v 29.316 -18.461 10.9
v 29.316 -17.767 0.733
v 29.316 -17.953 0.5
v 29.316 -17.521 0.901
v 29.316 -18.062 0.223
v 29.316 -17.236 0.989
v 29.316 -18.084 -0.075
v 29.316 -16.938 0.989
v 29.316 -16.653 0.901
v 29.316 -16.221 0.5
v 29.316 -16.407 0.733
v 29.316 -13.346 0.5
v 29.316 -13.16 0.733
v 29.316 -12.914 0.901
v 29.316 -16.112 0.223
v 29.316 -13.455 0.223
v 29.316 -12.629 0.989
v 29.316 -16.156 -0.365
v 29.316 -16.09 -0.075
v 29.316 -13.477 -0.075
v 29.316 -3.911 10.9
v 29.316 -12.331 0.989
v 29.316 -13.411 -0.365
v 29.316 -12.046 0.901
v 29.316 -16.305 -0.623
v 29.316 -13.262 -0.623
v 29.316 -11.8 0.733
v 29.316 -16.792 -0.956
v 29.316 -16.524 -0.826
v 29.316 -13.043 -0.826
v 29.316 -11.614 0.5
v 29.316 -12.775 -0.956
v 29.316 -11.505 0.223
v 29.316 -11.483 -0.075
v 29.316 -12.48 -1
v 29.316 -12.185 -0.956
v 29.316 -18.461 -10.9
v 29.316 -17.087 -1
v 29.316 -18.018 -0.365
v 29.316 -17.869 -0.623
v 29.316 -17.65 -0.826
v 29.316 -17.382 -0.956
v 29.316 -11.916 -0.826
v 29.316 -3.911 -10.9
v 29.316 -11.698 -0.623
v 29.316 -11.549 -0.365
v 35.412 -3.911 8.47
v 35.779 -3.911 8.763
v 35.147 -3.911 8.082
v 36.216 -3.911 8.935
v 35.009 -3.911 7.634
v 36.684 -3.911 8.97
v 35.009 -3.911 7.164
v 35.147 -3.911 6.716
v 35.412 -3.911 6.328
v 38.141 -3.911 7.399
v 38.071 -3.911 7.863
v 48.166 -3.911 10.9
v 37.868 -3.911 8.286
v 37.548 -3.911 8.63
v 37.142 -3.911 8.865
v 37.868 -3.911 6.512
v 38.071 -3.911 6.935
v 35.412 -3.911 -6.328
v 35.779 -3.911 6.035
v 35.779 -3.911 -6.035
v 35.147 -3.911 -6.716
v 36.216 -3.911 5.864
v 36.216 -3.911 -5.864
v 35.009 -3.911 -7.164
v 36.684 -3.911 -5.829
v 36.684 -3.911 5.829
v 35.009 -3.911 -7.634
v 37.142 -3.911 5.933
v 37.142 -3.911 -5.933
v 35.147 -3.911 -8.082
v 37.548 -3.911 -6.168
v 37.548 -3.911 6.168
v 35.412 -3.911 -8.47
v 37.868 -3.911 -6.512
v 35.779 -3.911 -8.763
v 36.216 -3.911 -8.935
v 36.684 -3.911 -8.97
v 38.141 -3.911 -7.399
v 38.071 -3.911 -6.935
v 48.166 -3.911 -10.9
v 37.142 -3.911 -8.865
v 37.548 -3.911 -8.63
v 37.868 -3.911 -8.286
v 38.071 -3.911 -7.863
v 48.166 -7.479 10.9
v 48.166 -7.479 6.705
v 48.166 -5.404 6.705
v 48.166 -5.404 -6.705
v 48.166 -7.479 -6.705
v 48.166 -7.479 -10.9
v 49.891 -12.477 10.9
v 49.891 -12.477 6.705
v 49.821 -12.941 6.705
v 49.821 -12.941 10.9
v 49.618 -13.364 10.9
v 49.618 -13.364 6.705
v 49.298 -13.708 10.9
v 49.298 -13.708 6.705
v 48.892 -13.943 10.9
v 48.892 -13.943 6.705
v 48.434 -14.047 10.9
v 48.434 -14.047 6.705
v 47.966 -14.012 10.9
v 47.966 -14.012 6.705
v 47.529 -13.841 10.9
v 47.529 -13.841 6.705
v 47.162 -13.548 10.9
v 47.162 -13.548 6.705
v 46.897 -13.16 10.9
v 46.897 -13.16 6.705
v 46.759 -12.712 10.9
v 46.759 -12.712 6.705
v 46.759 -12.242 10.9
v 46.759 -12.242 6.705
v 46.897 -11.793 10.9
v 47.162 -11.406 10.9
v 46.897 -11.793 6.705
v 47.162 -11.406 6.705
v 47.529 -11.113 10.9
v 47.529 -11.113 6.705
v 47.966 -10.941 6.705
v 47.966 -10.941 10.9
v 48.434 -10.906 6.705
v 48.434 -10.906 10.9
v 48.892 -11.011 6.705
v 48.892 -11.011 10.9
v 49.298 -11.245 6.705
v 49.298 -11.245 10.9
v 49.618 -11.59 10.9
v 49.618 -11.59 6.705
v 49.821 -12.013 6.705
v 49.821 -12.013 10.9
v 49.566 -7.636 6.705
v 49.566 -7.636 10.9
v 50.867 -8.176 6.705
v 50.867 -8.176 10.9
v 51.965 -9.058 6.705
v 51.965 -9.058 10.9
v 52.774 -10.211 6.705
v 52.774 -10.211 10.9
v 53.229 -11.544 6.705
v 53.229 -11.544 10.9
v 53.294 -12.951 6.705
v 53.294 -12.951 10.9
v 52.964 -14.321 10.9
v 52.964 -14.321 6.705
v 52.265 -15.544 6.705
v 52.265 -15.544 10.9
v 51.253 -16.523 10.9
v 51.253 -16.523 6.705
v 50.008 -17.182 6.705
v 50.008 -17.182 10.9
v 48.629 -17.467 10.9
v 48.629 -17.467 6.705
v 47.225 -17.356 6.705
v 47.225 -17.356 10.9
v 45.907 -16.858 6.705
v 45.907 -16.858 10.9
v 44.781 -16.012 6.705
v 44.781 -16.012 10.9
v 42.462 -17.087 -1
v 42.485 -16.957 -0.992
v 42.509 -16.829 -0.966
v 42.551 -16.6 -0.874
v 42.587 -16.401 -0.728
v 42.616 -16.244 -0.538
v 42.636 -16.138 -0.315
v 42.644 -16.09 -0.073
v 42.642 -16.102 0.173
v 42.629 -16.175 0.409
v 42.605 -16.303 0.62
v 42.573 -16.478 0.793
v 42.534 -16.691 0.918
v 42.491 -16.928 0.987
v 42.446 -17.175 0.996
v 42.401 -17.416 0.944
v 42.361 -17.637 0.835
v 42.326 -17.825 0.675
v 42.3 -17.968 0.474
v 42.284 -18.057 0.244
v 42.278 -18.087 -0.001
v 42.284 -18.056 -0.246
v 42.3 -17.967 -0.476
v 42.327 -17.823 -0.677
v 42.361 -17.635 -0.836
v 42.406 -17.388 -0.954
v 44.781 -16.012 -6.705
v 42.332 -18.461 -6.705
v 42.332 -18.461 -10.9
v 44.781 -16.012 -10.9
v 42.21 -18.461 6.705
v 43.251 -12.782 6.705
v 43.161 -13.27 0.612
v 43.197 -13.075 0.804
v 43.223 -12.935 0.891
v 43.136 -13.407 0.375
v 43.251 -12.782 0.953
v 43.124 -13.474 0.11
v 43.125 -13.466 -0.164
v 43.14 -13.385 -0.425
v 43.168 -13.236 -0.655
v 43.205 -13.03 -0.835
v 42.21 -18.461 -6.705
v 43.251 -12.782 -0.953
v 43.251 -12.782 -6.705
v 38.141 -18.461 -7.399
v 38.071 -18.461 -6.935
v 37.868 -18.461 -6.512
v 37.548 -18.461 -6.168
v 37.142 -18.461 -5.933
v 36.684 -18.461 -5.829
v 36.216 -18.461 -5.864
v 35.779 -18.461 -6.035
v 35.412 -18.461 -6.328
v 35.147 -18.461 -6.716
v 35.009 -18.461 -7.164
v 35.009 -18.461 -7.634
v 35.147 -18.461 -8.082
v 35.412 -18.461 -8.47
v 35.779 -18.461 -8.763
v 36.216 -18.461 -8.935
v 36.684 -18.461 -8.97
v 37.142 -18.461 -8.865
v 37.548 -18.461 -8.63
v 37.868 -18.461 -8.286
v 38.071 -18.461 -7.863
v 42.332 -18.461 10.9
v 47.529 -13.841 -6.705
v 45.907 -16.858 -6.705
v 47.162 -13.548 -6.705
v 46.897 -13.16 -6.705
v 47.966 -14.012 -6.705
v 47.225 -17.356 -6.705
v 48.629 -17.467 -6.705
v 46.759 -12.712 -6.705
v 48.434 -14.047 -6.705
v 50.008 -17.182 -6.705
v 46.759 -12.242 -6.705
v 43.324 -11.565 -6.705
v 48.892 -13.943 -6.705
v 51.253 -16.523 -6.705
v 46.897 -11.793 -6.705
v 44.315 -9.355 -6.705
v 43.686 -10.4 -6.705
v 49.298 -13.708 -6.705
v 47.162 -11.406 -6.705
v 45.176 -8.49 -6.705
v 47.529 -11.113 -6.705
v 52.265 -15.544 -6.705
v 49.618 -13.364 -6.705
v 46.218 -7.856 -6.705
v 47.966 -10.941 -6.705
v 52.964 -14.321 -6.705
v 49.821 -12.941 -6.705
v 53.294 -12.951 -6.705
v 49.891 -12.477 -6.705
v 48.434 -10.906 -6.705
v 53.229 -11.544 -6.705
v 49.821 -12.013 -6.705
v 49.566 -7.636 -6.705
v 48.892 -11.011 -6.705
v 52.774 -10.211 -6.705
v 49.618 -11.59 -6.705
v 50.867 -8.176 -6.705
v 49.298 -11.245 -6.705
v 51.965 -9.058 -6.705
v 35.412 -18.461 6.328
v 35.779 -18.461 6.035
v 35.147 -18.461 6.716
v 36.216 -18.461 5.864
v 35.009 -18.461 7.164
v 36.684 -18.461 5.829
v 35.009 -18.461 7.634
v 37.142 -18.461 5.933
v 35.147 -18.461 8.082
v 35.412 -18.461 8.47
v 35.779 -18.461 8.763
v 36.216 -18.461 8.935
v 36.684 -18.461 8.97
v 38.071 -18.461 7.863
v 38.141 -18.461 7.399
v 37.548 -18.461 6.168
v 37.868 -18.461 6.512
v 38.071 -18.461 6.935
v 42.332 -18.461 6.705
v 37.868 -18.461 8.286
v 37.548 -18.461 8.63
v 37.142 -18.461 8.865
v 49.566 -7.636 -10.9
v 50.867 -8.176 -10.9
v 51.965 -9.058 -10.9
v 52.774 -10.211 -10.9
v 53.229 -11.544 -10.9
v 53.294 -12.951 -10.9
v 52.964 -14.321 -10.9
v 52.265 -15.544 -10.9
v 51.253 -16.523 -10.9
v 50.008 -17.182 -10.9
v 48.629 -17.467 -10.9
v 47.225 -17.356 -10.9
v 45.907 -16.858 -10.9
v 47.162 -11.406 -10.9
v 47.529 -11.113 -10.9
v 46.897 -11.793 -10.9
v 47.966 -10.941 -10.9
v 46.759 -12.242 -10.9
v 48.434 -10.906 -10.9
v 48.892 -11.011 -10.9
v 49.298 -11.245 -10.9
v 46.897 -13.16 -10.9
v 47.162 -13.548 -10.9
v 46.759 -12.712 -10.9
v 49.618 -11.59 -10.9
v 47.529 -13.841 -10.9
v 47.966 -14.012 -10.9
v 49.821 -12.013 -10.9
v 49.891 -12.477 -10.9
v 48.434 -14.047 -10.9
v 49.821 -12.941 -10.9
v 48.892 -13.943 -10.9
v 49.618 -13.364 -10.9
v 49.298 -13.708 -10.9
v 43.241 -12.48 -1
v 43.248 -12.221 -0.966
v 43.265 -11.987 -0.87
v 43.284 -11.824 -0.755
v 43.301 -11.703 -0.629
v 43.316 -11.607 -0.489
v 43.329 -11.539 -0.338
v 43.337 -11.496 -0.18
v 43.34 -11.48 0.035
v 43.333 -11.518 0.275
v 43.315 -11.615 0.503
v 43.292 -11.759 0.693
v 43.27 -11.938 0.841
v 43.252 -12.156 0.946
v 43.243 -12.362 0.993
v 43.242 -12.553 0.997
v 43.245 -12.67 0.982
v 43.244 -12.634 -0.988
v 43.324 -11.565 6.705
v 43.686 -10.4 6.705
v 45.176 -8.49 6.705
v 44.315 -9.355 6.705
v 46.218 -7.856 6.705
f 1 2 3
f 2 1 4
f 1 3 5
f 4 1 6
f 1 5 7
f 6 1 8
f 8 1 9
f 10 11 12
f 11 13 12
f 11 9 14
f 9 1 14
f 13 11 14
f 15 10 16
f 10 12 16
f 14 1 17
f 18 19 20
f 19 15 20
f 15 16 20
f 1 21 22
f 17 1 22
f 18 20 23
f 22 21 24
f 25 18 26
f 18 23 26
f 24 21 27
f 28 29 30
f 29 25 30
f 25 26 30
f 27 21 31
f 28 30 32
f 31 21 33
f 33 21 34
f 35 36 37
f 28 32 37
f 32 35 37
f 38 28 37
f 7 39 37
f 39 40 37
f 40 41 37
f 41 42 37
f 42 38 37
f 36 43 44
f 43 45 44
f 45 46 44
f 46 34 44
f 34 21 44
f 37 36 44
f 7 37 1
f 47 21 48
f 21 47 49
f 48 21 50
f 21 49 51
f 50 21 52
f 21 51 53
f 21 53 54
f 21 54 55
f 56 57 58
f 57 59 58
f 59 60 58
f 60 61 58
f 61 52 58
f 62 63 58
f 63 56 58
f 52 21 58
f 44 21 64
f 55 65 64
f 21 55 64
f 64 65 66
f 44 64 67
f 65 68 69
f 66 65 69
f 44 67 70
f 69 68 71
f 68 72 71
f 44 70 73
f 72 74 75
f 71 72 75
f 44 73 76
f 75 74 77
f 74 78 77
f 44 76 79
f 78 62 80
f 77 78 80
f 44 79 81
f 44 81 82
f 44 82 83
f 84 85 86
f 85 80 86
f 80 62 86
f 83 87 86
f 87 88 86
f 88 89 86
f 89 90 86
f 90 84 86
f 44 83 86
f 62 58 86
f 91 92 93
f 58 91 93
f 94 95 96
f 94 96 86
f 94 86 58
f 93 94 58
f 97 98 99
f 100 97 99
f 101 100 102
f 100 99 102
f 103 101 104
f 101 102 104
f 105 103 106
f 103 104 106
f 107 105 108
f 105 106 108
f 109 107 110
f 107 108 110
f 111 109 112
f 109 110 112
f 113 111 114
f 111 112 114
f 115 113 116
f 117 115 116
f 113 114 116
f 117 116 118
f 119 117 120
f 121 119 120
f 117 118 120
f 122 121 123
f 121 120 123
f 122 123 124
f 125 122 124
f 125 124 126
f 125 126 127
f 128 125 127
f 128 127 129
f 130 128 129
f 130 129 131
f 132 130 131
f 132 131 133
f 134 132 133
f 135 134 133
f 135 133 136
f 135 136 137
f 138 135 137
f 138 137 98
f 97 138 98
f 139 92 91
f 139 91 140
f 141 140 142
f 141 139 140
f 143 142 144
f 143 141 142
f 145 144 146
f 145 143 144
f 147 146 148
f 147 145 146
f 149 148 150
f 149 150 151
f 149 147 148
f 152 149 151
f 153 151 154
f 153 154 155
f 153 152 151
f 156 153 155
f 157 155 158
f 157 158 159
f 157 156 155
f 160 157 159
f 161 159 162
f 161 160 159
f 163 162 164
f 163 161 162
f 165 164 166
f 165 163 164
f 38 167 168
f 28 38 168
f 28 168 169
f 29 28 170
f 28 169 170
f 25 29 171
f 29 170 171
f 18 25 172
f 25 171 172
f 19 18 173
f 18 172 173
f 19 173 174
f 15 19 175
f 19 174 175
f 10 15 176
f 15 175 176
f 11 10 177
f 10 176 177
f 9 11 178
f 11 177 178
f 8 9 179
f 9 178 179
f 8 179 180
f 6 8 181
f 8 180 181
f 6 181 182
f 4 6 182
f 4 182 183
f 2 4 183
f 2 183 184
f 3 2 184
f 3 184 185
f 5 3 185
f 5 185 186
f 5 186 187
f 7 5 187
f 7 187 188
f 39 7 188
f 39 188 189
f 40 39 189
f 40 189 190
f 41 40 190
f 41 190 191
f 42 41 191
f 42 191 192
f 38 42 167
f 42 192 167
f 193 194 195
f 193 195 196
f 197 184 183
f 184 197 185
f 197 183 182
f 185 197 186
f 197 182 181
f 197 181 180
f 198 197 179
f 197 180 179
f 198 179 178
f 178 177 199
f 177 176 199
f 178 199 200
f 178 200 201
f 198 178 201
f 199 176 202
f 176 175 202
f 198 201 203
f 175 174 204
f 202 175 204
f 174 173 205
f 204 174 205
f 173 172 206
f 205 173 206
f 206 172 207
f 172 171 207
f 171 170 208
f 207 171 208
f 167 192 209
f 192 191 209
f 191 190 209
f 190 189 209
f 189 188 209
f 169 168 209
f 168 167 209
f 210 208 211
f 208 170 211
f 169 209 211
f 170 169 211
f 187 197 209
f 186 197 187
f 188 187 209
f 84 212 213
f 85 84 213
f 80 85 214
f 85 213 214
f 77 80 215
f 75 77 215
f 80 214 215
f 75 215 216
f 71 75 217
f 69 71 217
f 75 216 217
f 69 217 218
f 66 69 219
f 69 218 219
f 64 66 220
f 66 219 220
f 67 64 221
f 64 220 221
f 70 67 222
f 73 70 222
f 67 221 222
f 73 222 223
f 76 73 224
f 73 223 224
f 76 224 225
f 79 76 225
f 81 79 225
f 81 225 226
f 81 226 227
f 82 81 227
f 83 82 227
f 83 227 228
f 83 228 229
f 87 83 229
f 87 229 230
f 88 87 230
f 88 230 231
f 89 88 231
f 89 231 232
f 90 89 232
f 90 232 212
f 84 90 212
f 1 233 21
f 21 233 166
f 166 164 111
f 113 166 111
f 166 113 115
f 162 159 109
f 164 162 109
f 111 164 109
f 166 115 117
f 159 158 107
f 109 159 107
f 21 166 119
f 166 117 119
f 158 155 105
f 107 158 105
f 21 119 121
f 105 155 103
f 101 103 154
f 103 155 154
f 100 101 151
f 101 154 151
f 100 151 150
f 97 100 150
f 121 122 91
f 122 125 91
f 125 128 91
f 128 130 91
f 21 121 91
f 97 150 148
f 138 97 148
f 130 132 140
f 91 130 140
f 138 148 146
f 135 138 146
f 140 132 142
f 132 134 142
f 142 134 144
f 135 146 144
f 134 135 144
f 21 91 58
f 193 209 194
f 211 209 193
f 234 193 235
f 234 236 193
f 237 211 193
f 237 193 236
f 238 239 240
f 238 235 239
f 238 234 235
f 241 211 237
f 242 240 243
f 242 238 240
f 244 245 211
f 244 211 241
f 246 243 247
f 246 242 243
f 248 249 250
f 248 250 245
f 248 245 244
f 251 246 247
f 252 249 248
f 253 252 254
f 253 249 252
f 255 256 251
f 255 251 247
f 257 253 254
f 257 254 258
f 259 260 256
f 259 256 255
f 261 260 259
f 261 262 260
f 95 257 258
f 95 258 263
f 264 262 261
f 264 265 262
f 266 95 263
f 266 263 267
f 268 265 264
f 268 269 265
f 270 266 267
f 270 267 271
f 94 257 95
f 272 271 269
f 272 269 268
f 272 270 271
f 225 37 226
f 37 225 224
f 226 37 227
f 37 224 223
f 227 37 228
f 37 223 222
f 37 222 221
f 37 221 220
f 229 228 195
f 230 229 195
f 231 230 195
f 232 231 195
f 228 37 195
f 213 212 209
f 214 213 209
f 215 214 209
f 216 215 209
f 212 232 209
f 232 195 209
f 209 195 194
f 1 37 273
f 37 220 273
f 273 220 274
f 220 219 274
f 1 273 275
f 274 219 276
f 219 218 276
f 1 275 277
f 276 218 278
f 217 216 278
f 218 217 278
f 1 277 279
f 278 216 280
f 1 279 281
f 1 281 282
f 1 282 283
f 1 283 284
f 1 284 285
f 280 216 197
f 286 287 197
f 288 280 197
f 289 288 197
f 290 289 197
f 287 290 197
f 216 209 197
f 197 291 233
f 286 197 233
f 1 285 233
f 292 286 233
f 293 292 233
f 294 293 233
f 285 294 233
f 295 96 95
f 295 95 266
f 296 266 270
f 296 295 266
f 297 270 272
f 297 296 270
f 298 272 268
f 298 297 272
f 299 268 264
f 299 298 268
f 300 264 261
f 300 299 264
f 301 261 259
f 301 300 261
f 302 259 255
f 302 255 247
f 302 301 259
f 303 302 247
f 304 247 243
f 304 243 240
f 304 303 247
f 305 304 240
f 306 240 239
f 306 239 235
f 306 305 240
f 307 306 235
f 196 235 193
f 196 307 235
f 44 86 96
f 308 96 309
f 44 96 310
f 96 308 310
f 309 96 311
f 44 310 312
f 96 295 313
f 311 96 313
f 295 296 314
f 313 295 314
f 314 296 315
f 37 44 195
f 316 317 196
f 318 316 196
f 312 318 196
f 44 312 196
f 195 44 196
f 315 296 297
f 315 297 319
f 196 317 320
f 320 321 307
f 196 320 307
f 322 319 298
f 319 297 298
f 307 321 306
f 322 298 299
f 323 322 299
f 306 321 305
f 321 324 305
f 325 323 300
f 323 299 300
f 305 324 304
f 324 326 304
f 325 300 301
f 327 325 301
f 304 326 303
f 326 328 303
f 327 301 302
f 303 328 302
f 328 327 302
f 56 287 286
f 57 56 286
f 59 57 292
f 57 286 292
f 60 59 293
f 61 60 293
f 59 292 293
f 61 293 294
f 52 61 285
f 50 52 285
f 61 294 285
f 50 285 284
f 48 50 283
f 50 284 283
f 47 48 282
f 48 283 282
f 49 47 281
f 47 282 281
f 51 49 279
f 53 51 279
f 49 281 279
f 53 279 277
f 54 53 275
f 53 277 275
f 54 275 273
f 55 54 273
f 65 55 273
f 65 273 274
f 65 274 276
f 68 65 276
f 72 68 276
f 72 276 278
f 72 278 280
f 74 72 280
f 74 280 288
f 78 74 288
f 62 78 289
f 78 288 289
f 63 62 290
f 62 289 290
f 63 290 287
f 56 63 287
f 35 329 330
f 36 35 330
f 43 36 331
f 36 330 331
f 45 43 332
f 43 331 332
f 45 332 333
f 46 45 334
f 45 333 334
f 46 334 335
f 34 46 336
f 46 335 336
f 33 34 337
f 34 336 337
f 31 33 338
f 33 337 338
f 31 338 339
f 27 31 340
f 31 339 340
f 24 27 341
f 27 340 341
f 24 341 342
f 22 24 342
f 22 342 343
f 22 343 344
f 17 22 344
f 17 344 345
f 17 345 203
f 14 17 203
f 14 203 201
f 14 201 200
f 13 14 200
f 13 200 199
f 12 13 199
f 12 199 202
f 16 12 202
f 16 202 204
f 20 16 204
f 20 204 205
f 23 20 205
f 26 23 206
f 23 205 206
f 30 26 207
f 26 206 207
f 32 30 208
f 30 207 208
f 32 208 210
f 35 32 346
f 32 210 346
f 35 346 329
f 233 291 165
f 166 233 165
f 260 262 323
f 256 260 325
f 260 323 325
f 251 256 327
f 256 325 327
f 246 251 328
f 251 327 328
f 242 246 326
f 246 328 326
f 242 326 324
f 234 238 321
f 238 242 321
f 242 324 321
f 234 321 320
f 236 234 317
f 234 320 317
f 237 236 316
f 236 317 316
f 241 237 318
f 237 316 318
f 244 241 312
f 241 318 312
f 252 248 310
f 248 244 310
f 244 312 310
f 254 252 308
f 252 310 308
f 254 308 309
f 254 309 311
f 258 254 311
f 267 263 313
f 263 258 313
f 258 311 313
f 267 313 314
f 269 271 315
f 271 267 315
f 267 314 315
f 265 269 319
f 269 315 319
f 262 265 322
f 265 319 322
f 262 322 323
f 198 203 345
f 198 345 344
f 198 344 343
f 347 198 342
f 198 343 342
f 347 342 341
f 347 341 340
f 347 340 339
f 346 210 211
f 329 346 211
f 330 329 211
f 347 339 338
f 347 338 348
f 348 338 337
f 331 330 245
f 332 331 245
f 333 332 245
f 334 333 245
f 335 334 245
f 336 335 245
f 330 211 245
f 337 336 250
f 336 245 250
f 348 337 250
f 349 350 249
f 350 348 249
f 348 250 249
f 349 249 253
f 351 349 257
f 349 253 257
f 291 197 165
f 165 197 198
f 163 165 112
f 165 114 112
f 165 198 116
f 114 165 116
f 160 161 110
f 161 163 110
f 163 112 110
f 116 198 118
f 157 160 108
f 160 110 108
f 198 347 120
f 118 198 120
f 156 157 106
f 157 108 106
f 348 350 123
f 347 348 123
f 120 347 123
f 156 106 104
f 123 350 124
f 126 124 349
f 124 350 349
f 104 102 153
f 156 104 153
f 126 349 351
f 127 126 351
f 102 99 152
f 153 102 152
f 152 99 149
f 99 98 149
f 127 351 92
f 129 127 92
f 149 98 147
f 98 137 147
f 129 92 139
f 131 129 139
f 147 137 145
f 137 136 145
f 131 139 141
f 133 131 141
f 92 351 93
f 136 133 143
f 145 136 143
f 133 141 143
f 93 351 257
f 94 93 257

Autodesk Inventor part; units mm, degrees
sketch "Sketch2" plane through (0, 0, 0) normal (0, 0, 1) x (1, 0, 0)
  line L0 (40.7935, -19.9997) -> (-67.2065, -19.9997)
  line L1 (-67.2065, -19.9997) -> (-67.2065, 11.0003)
  circle A0 centre (48.3164, -12.4768) radius 1.575
  arc A1 (44.7809, -16.0123) -> (48.1664, -7.4791) centre (48.3164, -12.4768) ccw
  line L2 (48.1664, 0.0003) -> (48.1664, -7.4791)
  line L3 (48.3164, -12.4768) -> (48.1664, -12.6268)
  line L4 (44.7809, -16.0123) -> (40.7935, -19.9997)
  line L5 (-67.2065, 11.0003) -> (28.1664, 11.0003)
  line L6 (28.1664, 11.0003) -> (48.1664, 0.0003)
  dimension "d19" = 3.15
  dimension "d88" = 10
  dimension "d90" = 0.15
  dimension "d91" = 10.639
  dimension "d111" = 31
  dimension "d135" = 12.4771
  dimension "d176" = 135
  dimension "d177" = 108
extrude "Extrusion1" add sketch "Sketch2" along normal mid plane 23
sketch "Sketch5" plane through (0, 0, 0) normal (0, 0, 1) x (1, 0, 0)
  circle A0 centre (48.3164, -12.4768) radius 1.575 projected
  circle A1 centre (48.3164, -12.4768) radius 5.075
  circle A2 centre (48.3164, -12.4768) radius 1.5
  point P0 (0, 0)
  dimension "d28" = 3
  dimension "d29" = 10.15
extrude "Extrusion3" cut sketch "Sketch5" along normal mid plane 13.41 contours A1
chamfer "Chamfer2" distance 2 angle 45 1 edges at (48.1664, -7.404, 0)
sketch "Sketch15" plane through (48.1664, -7.4791, -11.5) normal (1, 0, 0) x (0, 0, -1)
  arc A0 (-14.3604, 7.4791) -> (-8.6396, 7.4791) centre (-11.5, 7.4791) ccw
  line L0 (-14.3604, 7.4791) -> (-14.3604, 27.4791)
  line L1 (-14.3604, 27.4791) -> (-8.6396, 27.4791)
  line L2 (-8.6396, 27.4791) -> (-8.6396, 7.4791)
  point P0 (-14.3604, 7.4793)
  point P1 (-11.5, 27.4791)
  dimension "d95" = 5.7208
  dimension "d113" = 20
sketch "Sketch19" plane through (-67.2065, -19.9997, 11.5) normal (0, -1, 0) x (1, 0, 0)
  line L0 (63.0729, -6) -> (91.3729, -6)
  line L1 (91.3729, -6) -> (91.3729, -19.5)
  line L2 (91.3729, -19.5) -> (63.0729, -19.5)
  line L3 (63.0729, -19.5) -> (63.0729, -6)
  line L4 (63.0729, -6) -> (91.3729, -19.5) construction
  line L5 (91.3729, -6) -> (63.0729, -19.5) construction
  line L6 (115.3729, -18.205) -> (115.3729, -4.795) projected
  line L7 (95.3729, 0) -> (0, 0) projected
  line L8 (108, -23) -> (0, -23) projected
  circle A0 centre (77.2229, -12.75) radius 8.1325
  point P0 (67.2065, -11.5)
  dimension "d104" = 13.5
  dimension "d114" = 24
  dimension "d195" = 28.3
  dimension "d205" = 6
  dimension "d224" = 16.265
extrude "Extrusion13" cut sketch "Sketch19" against normal blind 30 contours L0 A0 L2 L3 | L0 A0 L2 | L0 L1 L2 A0
sketch "Sketch21" plane through (-67.2065, -19.9997, 11.5) normal (0, -1, 0) x (1, 0, 0)
  line L0 (63.0729, -6) -> (91.3729, -6) projected
  line L1 (63.0729, -19.5) -> (63.0729, -6) construction
  line L2 (91.3729, -19.5) -> (63.0729, -19.5) construction
  line L3 (63.0729, -6) -> (91.3729, -19.5)
  line L4 (91.3729, -6) -> (63.0729, -19.5)
  line L5 (95.0229, -19.5) -> (59.4229, -19.5)
  line L6 (59.4229, -19.5) -> (59.4229, -6)
  line L7 (59.4229, -6) -> (95.0229, -6)
  line L8 (95.0229, -6) -> (95.0229, -19.5)
  line L9 (95.0229, -19.5) -> (59.4229, -6) construction
  line L10 (59.4229, -19.5) -> (95.0229, -6) construction
  line L11 (108, -23) -> (108, 0) projected
  point P0 (77.2229, -12.75)
  point P1 (26.7729, -20.5)
  point P2 (26.7729, -7)
  dimension "d164" = 35.6
  dimension "d165" = 13.5
extrude "Extrusion14" cut sketch "Sketch21" against normal blind 10.1
sketch "Sketch20" plane through (-67.2065, 11.0003, 11.5) normal (0, 1, 0) x (1, 0, 0)
  line L0 (115.3729, 23) -> (115.3729, 0) projected
  line L1 (115.3729, 11.5) -> (95.3729, 11.5)
  point P0 (67.2065, 11.5)
  dimension "d107" = 20
sweep "Sweep3" cut profiles "Sketch15" path "Sketch20" path curves L1
sketch "Sketch22" plane through (48.1664, -7.4791, 11.5) normal (1, 0, 0) x (0, 0, -1)
  circle A0 centre (11.5, -5.0007) radius 1
  line L0 (23, -12.5207) -> (0, -12.5207) projected
  circle A1 centre (11.5, -9.6079) radius 1
  point P0 (11.5, 7.4791)
  dimension "d126" = 7.52
  dimension "d127" = 2.9128
  dimension "d128" = 2
  dimension "d129" = 2
extrude "Extrusion15" cut sketch "Sketch22" against normal through all
ref_plane "Work Plane4" through (48.1664, -2.8604, 0) normal (0, 1, 0) x (-1, 0, 0)
sketch "Sketch26" plane through (48.1664, -2.8604, 0) normal (0, 1, 0) x (-1, 0, 0)
  line L0 (0, -6.705) -> (0, 6.705) projected
  arc A0 (16.24, -0.7321) -> (16.24, 0.7321) centre (16.24, 0) ccw
  line L1 (16.24, -0.7321) -> (0, -0.7321)
  line L2 (16.24, 0.7321) -> (0, 0.7321)
  line L3 (0, 0.7321) -> (0, -0.7321)
  point P0 (48.1664, 0)
  dimension "d147" = 1.4642
chamfer "Chamfer3" distance 3.6 angle 45 1 edges at (44.7278, -16.0654, 0)
extrude "Extrusion22" add sketch "Sketch26" along normal up to surface surface through (48.1664, 0.0003, 0) normal (0.4819187, 0.8762159, 0)
sketch "Sketch29" plane through (-67.2065, -9.8997, 11.5) normal (0, -1, 0) x (1, 0, 0)
  line L0 (95.0229, -6) -> (95.0229, -19.5) projected
  line L1 (91.3729, -15.7347) -> (95.0229, -15.7347)
  line L2 (95.0229, -15.7347) -> (95.0229, -9.7653)
  line L3 (95.0229, -9.7653) -> (91.3729, -9.7653)
  line L4 (91.3729, -9.7653) -> (91.3729, -15.7347)
  line L5 (91.3729, -19.5) -> (91.3729, -15.7347)
  line L6 (91.3729, -9.7653) -> (91.3729, -6)
  point P0 (67.2065, -11.5)
  dimension "d202" = 3.7653
  dimension "d203" = 3.7653
extrude "Extrusion23" cut sketch "Sketch29" against normal through all
pattern_linear "Rectangular Pattern6" count 2 spacing -31.95 along (1, 0, 0) of "Extrusion23"
pattern_linear "Rectangular Pattern8" count 4 spacing 30 along (0, 0, 1) of "Extrusion1", "Extrusion3", "Chamfer2", "Sweep3", "Extrusion15", "Chamfer3", "Extrusion22"
sketch "Sketch30" plane through (0, 0, 11.5) normal (0, 0, 1) x (1, 0, 0)
  line L0 (48.1664, -7.4791) -> (48.1664, 0.0003) projected
  line L1 (48.1664, 0.0003) -> (28.1664, 11.0003) projected
  line L2 (28.1664, 11.0003) -> (-67.2065, 11.0003) projected
  line L3 (-67.2065, 11.0003) -> (-67.2065, -19.9997) projected
  line L4 (-67.2065, -19.9997) -> (40.7935, -19.9997) projected
  line L5 (40.7935, -19.9997) -> (44.7809, -16.0123) projected
  arc A0 (44.7809, -16.0123) -> (48.1664, -7.4791) centre (48.3164, -12.4768) ccw projected
  circle A1 centre (48.3164, -12.4768) radius 1.575 projected
  circle A2 centre (48.3164, -12.4768) radius 5
  point P0 (0, 0)
  point P1 (28.1664, -19.9997)
extrude "Extrusion24" add sketch "Sketch30" along normal up to surface (7 mm away) contours A2 L5 L4 L3 L2 L1 L0
pattern_linear "Rectangular Pattern9" count 3 spacing 30 along (0, 0, 1) of "Extrusion24"
pattern_linear "Rectangular Pattern10" count 6 spacing 18.5 along (0, 0, 1) of "Extrusion13", "Extrusion14", "Extrusion23", "Rectangular Pattern6"
sketch "Sketch32" plane through (-67.2065, -19.9997, -11.5) normal (0, -1, 0) x (1, 0, 0)
  line L0 (43.9229, 7) -> (57.4229, 7)
  line L1 (57.4229, 7) -> (57.4229, 35.3)
  line L2 (57.4229, 35.3) -> (43.9229, 35.3)
  line L3 (43.9229, 35.3) -> (43.9229, 7)
  line L4 (57.4229, 35.3) -> (43.9229, 7)
  line L5 (57.4229, 7) -> (43.9229, 35.3)
  line L6 (59.4229, 3.5) -> (59.4229, 17) projected
  line L7 (108, 0) -> (0, 0) projected
  point P0 (67.2065, 11.5)
  dimension "d218" = 28.3
  dimension "d219" = 13.5
  dimension "d225" = 2
  dimension "d226" = 7
extrude "Extrusion26" cut sketch "Sketch32" against normal blind 30
sketch "Sketch33" plane through (-67.2065, -19.9997, -11.5) normal (0, -1, 0) x (1, 0, 0)
  line L0 (43.9229, 35.3) -> (57.4229, 35.3) projected
  line L1 (57.4229, 35.3) -> (57.4229, 7) projected
  line L2 (57.4229, 7) -> (43.9229, 7) projected
  line L3 (43.9229, 7) -> (43.9229, 35.3) projected
  line L4 (57.4229, 35.3) -> (43.9229, 7)
  line L5 (57.4229, 7) -> (43.9229, 35.3)
  line L6 (57.4229, 3.35) -> (43.9229, 3.35)
  line L7 (43.9229, 3.35) -> (43.9229, 38.95)
  line L8 (43.9229, 38.95) -> (57.4229, 38.95)
  line L9 (57.4229, 38.95) -> (57.4229, 3.35)
  line L10 (57.4229, 3.35) -> (43.9229, 38.95) construction
  line L11 (43.9229, 3.35) -> (57.4229, 38.95) construction
  point P0 (67.2065, 11.5)
  point P1 (50.6729, 21.15)
  point P2 (57.4229, 7)
  dimension "d240" = 13.5
  dimension "d241" = 35.6
extrude "Extrusion27" cut sketch "Sketch33" against normal blind 10.1
sketch "Sketch34" plane through (-67.2065, -9.8997, -11.5) normal (0, -1, 0) x (1, 0, 0)
  line L0 (57.4229, 3.35) -> (43.9229, 3.35) projected
  line L1 (43.9229, 7) -> (57.4229, 7) projected
  line L2 (57.4229, 7) -> (43.9229, 7) projected
  line L3 (53.6579, 7) -> (47.6879, 7)
  line L4 (47.6879, 7) -> (47.6879, 3.35)
  line L5 (47.6879, 3.35) -> (53.6579, 3.35)
  line L6 (53.6579, 3.35) -> (53.6579, 7)
  line L7 (57.4229, 35.3) -> (57.4229, 7) projected
  line L8 (57.4229, 7) -> (53.6579, 7)
  line L9 (47.6879, 7) -> (43.9229, 7)
  point P0 (67.2065, 11.5)
  point P1 (53.6579, 3.35)
  point P2 (47.6879, 7)
  dimension "d242" = 3.765
extrude "Extrusion28" cut sketch "Sketch34" against normal through all
pattern_linear "Rectangular Pattern11" count 2 spacing 31.95 along (0, 0, 1) of "Extrusion28"
pattern_linear "Rectangular Pattern12" count 2 spacing 70.5 along (0, 0, 1) of "Extrusion26", "Extrusion27", "Extrusion28", "Rectangular Pattern11"
ref_plane "Work Plane16" through (-67.2065, -4.4997, 87.6614) normal (0.9396926, 0, 0.3420201) x (0, 1, 0)
sketch "Sketch37" plane through (-67.2065, -4.4997, 87.6614) normal (0.9396926, 0, 0.3420201) x (0, 1, 0)
  line L0 (-15.5, -7.5229) -> (-7.9771, 0) projected
  circle A0 centre (-7.9771, 0.15) radius 4.925
  circle A1 centre (-7.9771, 0.15) radius 1.575
  point P0 (4.4997, -105.3608)
  dimension "d271" = 0.15
  dimension "d272" = 9.85
  dimension "d273" = 3.15
sketch "Sketch39" plane through (-67.2065, -19.9997, 101.5) normal (0, 0, 1) x (1, 0, 0)
  line L0 (95.3729, 31) -> (0, 31) projected
  line L1 (95.3729, 0) -> (0, 0) projected
  line L2 (0, 31) -> (0, 0) projected
  line L3 (30.3, 0) -> (7, 0)
  line L4 (7, 0) -> (7, 31)
  line L5 (7, 31) -> (30.3, 31)
  line L6 (30.3, 31) -> (30.3, 0)
  point P0 (67.2065, 19.9997)
  point P1 (30.3, 31)
  point P2 (7, 0)
  dimension "d275" = 23.3
  dimension "d276" = 7
extrude "Extrusion36" cut sketch "Sketch39" against normal blind 41 contours L6 L1 L4 L0
sketch "Sketch40" plane through (-36.9065, -19.9997, 101.5) normal (-1, 0, 0) x (0, 0, 1)
  line L0 (-41, 31) -> (-41, 0) projected
  line L1 (-41, 15.5) -> (-26, 15.5)
  circle A0 centre (-26, 15.5) radius 15
  circle A1 centre (-26, 15.5) radius 1.575
  point P0 (-101.5, 19.9997)
  dimension "d279" = 15
  dimension "d280" = 30
  dimension "d281" = 3.15
extrude "Extrusion37" cut sketch "Sketch40" along normal through all contours A1
extrude "Extrusion38" cut sketch "Sketch40" against normal blind 10 contours A1
chamfer "Chamfer5" distance 13.75 angle 45 1 edges at (-36.9065, -4.4997, 101.5)
ref_plane "Work Plane17" through (60.4164, -7.4791, -11.5) normal (1, 0, 0) x (0, 0, -1)
sketch "Sketch41" plane through (60.4164, -7.4791, -11.5) normal (1, 0, 0) x (0, 0, -1)
  line L0 (-0.6, -10.9819) -> (-22.4, -10.9819)
  line L1 (-22.4, -10.9819) -> (-22.4, 3.5681)
  line L2 (-22.4, 3.5681) -> (-0.6, 3.5681)
  line L3 (-0.6, 3.5681) -> (-0.6, -10.9819)
  line L4 (0, -9.9977) -> (0, 0.0023) projected
  line L5 (-18.205, -11.1319) -> (-4.795, -11.1319) projected
  line L6 (-23, 0.0023) -> (-23, -9.9977) projected
  point P0 (-11.5, 7.4791)
  point P1 (0, 0)
  point P2 (0, -8.5333)
  point P3 (-23, -8.5333)
  point P4 (-23, 0)
  dimension "d293" = 14.55
  dimension "d306" = 0.15
  dimension "d307" = 0.6
  dimension "d308" = 0.6
  dimension "d311" = 21.8
extrude "Extrusion39" cut sketch "Sketch41" against normal blind 31.1 keep common part
sketch "Sketch42" plane through (-67.2065, -19.9997, -11.5) normal (0, -1, 0) x (1, 0, 0)
  circle A0 centre (103.7729, 4.1009) radius 1.575
  line L0 (103.7729, 11.5) -> (97.0263, 11.5)
  circle A1 centre (103.7729, 18.8991) radius 1.575
  point P0 (67.2065, 11.5)
  dimension "d302" = 3.15
  dimension "d303" = 0
  dimension "d309" = 3.15
  dimension "d310" = 7.3991
extrude "Extrusion40" cut sketch "Sketch42" against normal blind 25
ref_plane "Work Plane11" through (48.1664, -2.8604, 30) normal (0, 1, 0) x (-1, 0, 0)
ref_plane "Work Plane12" through (48.1664, -2.8604, 60) normal (0, 1, 0) x (-1, 0, 0)
ref_plane "Work Plane13" through (48.1664, -2.8604, 90) normal (0, 1, 0) x (-1, 0, 0)
equation "\"d88\" = diametroFueraUnion"
equation "\"d90\" = tolerancia"
equation "\"d28\" = diametroDentroUnion"
equation "\"d29\" = diametroFueraUnion + tolerancia"
equation "\"d10\" = 10.639"
equation "\"d16\" = 135deg"
equation "\"d26\" = 135deg"
equation "\"d27\" = 135deg"
equation "\"d30\" = 135deg"
equation "\"d34\" = 23"
equation "\"d35\" = 0"
equation "\"d40\" = 135deg"
equation "\"d41\" = 10.639"
equation "\"d42\" = 11.8875"
equation "\"d43\" = 0"
equation "\"diametroDentroUnion\" = 3"
equation "\"diametroFueraUnion\" = 10"
equation "\"d45\" = 15"
equation "\"d39\" = diametroDentroUnion"
equation "\"anchoServo\" = 12.2"
equation "\"tolerancia\" = 0.15"
equation "\"d193\" = 0.15"
equation "\"d199\" = 0.15"
equation "\"d215\" = 0.15"
equation "\"d216\" = 0.15"
equation "\"servoLargo\" = 28"
equation "\"servoLargoConOrejas\" = 35.3"
equation "\"servoAncho\" = 13.2"
equation "\"ServoAlto\" = 29.7"
equation "\"diametroPolea\" = 16.265"
properties part number "sujeciones_dedos_V13"
